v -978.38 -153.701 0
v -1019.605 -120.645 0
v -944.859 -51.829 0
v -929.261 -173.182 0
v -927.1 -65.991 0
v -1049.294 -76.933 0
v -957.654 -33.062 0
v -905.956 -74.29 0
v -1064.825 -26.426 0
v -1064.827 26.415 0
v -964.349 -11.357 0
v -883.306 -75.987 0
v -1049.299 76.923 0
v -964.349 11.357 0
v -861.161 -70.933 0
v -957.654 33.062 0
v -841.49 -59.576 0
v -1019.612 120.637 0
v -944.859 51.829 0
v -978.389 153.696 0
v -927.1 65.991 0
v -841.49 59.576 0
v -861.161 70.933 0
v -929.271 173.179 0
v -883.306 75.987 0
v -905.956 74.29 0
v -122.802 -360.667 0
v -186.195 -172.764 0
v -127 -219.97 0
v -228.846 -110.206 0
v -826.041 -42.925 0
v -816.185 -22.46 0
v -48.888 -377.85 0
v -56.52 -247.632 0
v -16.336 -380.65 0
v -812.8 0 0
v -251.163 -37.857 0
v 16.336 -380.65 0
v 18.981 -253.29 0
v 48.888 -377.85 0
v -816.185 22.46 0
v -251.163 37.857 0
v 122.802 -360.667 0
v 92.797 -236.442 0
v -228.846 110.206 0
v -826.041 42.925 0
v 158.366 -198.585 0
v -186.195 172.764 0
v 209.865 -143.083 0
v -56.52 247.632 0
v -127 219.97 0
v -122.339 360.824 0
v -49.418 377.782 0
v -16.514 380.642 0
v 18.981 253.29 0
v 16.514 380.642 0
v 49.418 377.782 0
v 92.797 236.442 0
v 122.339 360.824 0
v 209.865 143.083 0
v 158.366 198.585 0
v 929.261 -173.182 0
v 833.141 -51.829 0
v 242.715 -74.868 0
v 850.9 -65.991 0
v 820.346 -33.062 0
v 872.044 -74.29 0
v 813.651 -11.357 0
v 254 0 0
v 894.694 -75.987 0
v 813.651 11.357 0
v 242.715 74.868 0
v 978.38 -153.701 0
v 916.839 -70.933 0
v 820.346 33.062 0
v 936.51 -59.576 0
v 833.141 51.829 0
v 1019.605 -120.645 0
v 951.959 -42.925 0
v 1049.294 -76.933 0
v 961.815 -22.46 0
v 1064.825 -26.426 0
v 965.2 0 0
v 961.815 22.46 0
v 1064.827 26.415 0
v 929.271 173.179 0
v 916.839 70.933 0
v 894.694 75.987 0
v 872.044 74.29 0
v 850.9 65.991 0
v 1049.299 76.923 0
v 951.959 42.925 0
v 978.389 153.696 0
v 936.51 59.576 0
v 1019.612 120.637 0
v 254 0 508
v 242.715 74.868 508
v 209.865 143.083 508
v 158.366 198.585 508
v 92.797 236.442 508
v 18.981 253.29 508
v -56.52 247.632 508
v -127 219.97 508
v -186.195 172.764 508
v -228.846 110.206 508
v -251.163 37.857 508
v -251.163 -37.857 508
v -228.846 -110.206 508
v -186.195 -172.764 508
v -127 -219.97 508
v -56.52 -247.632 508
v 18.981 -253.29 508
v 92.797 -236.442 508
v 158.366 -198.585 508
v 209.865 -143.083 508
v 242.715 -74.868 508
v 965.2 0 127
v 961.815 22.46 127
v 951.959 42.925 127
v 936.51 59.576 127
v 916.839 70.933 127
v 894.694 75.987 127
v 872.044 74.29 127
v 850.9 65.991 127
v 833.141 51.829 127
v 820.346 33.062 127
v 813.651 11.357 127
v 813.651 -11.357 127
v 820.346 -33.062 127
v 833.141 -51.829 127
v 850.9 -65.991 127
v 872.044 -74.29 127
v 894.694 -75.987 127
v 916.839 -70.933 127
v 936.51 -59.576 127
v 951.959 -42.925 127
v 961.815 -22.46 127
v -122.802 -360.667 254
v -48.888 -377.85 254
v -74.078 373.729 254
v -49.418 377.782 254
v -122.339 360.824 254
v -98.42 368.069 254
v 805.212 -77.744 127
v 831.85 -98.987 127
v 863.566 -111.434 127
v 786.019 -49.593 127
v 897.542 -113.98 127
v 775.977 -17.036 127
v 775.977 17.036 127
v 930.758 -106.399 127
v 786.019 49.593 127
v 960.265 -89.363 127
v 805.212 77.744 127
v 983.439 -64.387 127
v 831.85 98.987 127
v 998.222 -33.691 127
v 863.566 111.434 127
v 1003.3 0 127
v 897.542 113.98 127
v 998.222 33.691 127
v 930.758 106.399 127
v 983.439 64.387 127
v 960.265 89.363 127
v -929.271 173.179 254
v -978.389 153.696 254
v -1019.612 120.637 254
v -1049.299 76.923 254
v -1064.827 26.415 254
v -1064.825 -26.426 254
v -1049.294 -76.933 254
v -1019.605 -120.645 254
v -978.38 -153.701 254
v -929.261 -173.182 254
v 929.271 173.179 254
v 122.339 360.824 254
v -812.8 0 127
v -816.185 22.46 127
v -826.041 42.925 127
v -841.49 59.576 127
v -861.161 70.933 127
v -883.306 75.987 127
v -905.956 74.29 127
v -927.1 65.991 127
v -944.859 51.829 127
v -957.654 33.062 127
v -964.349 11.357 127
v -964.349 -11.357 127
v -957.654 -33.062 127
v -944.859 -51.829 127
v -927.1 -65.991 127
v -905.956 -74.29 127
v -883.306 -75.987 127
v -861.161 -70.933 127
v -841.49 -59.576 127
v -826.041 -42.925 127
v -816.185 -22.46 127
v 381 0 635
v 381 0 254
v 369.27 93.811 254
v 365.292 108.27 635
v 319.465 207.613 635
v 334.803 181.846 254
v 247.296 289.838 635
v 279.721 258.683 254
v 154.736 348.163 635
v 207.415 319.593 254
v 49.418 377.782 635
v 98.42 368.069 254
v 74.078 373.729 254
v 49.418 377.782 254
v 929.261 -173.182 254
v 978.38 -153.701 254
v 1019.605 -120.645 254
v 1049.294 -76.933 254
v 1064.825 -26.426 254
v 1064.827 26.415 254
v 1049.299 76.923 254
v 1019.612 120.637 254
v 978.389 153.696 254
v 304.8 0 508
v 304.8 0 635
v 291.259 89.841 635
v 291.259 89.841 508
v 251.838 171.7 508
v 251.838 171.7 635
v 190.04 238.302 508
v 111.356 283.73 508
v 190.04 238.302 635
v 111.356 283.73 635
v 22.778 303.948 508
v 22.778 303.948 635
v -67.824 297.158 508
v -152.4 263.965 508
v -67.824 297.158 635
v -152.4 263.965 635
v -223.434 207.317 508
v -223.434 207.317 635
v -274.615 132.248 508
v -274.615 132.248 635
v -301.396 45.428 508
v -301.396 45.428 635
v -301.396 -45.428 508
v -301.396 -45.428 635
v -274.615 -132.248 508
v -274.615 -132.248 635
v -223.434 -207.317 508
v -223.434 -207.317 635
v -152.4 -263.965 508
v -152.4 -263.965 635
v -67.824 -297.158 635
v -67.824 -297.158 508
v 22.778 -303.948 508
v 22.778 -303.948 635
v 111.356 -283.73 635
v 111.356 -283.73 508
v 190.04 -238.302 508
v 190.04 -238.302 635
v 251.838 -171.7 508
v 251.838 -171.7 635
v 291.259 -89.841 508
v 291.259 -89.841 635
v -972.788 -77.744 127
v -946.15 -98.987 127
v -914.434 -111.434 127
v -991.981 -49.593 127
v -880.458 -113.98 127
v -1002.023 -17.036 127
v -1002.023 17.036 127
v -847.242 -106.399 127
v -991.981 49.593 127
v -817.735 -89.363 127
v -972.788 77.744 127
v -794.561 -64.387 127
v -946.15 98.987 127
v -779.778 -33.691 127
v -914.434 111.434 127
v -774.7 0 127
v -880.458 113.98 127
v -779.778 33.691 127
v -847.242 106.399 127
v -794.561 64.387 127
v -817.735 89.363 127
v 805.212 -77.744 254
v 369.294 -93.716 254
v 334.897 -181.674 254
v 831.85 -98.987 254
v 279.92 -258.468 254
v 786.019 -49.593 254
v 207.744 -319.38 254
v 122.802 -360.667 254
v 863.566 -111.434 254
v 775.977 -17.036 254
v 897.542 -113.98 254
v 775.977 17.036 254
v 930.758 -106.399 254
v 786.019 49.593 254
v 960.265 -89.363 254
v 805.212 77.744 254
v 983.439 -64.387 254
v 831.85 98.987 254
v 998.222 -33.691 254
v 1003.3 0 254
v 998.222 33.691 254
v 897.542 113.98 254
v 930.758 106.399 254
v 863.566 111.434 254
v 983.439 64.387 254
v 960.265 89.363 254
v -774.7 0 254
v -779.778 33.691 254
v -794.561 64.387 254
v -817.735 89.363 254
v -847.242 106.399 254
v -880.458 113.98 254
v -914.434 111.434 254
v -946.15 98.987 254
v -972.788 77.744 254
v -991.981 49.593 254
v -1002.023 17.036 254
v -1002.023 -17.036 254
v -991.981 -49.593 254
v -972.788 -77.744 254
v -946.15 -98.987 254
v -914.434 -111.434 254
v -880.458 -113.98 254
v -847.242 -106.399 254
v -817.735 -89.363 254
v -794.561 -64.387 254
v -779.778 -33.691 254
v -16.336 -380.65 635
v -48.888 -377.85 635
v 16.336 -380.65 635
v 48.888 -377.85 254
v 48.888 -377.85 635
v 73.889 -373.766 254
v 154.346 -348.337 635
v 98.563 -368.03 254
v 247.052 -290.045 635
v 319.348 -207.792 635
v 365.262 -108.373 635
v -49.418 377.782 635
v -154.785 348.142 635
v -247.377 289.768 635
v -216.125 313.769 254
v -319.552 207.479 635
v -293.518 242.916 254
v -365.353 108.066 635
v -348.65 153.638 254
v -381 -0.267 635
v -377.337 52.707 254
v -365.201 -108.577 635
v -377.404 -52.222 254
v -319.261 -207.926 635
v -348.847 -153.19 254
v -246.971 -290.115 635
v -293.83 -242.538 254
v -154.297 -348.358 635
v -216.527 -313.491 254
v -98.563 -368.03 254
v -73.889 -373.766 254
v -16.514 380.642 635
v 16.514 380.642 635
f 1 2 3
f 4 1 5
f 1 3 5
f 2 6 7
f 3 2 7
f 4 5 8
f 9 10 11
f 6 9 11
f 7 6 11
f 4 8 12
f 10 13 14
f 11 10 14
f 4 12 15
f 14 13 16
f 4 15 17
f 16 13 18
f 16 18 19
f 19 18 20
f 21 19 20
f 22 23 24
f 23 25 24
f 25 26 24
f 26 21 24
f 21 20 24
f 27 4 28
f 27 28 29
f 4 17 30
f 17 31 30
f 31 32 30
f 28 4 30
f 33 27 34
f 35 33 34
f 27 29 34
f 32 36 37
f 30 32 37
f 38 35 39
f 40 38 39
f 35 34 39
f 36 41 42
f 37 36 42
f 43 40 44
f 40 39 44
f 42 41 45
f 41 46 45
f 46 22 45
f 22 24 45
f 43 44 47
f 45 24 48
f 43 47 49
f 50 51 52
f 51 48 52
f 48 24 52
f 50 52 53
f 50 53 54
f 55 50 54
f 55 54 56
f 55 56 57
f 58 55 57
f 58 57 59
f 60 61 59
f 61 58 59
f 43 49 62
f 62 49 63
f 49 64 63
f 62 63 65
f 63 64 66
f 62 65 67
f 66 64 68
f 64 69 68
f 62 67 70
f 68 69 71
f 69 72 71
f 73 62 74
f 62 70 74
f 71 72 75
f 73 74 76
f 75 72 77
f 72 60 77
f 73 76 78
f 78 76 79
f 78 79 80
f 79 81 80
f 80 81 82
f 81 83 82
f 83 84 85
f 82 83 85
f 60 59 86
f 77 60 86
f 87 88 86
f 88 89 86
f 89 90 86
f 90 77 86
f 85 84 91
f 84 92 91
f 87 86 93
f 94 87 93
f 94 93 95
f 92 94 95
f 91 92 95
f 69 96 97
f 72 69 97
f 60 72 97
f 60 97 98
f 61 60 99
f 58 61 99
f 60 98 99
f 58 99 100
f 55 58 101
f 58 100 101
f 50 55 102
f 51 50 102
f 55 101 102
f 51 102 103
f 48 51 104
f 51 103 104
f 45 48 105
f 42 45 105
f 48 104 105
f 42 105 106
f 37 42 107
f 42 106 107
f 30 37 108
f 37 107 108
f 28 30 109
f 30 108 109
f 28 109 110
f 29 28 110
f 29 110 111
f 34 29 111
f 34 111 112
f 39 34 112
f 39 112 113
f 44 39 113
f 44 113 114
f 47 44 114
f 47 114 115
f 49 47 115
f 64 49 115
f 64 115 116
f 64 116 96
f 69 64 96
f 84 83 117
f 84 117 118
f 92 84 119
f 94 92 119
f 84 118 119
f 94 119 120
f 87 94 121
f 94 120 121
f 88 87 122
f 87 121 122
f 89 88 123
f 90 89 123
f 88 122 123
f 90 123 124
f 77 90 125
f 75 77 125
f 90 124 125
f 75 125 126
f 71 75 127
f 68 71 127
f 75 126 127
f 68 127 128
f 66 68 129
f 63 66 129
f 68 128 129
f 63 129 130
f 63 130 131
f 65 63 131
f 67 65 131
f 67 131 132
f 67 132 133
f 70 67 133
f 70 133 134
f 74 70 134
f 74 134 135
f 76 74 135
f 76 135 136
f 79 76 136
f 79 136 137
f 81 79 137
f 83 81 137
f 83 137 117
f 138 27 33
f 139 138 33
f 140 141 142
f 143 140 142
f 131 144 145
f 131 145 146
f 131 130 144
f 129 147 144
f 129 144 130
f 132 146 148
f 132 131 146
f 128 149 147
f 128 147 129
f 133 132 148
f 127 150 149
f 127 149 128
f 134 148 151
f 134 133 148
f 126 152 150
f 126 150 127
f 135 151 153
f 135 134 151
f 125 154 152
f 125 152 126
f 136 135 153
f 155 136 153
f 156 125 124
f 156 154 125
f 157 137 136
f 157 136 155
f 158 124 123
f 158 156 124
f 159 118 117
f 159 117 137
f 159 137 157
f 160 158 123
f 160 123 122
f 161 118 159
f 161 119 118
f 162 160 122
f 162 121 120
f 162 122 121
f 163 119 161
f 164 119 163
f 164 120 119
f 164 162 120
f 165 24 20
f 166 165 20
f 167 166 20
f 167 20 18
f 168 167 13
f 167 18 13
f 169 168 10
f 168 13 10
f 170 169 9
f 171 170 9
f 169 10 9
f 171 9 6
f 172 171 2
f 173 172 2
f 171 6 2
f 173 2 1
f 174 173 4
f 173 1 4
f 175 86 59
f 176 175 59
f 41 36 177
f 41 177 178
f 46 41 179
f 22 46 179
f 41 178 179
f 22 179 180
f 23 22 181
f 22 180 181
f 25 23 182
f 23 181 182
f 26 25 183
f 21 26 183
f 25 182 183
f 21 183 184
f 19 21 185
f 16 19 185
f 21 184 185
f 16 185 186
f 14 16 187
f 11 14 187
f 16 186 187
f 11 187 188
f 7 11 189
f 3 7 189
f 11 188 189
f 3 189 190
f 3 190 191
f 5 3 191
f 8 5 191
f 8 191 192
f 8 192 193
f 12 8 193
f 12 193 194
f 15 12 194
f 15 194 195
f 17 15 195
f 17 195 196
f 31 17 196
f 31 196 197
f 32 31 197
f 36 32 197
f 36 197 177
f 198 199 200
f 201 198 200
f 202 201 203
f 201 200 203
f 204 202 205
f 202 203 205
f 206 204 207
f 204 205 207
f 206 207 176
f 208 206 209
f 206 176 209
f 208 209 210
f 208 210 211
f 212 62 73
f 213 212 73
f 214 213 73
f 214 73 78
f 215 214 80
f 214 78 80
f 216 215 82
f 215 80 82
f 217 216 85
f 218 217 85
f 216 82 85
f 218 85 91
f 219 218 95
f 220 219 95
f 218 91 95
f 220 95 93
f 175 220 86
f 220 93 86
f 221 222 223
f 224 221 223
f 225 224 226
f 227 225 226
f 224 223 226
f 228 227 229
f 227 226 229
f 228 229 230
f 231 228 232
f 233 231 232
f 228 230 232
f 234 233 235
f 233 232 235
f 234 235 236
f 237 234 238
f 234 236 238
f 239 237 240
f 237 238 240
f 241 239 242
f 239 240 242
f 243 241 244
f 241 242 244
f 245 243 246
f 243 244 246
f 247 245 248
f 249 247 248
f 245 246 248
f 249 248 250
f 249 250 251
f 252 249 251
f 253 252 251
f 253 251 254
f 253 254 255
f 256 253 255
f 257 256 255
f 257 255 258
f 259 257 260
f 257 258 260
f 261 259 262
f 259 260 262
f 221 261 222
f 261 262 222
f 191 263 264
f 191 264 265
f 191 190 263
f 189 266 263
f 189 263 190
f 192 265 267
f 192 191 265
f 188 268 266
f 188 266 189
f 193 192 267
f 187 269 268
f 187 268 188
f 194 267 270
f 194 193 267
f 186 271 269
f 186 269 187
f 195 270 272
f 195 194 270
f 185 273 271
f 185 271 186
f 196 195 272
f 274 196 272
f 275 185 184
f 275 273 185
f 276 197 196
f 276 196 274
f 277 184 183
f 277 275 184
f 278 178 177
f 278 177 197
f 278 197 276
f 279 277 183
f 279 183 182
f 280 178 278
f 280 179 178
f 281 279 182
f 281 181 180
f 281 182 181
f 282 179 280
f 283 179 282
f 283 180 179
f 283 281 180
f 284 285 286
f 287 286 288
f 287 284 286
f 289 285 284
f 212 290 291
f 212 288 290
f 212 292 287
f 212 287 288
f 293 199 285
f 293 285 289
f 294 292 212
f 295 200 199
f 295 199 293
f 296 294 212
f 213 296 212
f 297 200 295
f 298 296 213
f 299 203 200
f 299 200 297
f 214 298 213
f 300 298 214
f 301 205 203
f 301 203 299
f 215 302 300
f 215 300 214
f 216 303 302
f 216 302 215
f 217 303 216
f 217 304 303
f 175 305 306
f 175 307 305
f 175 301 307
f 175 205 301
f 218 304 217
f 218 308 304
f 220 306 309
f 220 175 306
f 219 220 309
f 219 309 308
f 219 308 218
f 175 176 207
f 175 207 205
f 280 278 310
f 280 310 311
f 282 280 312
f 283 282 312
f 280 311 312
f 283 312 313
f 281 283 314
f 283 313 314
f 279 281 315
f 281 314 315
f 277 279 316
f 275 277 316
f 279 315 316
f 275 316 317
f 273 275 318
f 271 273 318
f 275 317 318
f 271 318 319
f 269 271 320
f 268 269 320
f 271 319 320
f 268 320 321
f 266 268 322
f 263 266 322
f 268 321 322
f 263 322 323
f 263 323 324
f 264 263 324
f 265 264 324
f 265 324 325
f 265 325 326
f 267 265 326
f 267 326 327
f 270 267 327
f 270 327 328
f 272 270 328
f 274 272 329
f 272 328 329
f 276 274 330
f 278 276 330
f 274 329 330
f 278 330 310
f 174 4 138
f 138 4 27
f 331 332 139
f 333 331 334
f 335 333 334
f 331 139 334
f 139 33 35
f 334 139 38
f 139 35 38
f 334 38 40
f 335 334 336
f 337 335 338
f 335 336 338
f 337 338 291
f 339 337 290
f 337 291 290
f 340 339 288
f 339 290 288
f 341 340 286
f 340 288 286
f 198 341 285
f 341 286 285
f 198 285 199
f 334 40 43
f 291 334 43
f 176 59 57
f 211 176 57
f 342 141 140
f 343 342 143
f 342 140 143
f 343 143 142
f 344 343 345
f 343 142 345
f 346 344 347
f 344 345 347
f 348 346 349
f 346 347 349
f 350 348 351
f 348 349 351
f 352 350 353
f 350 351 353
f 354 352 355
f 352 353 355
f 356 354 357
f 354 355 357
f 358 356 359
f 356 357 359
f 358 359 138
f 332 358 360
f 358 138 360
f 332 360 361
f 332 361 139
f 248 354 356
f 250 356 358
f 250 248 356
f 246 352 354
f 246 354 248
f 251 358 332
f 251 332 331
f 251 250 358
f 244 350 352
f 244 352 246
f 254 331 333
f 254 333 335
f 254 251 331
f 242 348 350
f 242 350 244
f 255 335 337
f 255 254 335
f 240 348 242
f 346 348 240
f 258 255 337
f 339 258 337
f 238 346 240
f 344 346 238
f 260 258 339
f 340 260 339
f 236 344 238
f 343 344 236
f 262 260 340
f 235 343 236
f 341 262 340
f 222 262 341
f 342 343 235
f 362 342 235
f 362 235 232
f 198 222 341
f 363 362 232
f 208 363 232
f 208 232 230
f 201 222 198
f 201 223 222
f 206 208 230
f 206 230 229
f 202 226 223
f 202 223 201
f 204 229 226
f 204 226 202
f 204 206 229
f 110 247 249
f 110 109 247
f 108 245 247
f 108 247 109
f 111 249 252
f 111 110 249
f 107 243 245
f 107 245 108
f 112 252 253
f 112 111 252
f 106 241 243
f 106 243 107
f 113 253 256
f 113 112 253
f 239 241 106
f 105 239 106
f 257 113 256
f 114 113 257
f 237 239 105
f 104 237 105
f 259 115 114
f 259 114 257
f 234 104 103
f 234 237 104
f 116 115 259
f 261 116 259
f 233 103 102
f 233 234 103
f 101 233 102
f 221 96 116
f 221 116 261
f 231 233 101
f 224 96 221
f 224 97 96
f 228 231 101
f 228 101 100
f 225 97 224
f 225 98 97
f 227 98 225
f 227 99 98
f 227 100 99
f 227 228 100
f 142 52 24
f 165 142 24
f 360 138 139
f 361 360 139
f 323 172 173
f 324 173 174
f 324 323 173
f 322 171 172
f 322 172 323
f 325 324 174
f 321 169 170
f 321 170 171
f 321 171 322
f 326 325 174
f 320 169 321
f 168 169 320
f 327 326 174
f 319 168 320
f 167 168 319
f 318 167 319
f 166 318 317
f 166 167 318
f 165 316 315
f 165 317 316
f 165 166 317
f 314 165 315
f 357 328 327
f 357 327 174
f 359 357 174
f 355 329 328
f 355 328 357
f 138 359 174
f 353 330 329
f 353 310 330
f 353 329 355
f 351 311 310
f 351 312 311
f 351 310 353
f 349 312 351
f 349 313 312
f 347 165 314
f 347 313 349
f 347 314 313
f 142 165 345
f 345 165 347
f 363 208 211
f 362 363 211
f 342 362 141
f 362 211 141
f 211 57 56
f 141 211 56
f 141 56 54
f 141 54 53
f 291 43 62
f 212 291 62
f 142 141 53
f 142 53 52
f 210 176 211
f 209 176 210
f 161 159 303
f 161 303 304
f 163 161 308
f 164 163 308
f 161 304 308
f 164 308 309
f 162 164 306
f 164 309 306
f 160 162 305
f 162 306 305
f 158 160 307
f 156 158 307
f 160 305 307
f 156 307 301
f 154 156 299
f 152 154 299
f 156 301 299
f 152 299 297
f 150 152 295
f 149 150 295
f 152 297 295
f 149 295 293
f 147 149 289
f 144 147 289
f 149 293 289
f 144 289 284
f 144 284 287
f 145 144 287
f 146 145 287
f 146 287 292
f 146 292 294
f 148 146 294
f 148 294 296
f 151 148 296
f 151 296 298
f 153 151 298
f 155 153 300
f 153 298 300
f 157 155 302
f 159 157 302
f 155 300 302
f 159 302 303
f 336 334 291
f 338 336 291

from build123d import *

# Parameters (mm, degrees)
F1_DEPTH  = 254
F3_DEPTH  = 381
F4_R      = 254
F5_DEPTH  = 635
F6_R      = 304.8
F7_DEPTH  = 127
F8_R      = 76.2
F9_DEPTH  = 254
F10_R     = 114.3
F11_DEPTH = 127
F12_R     = 114.3
F13_DEPTH = 127


with BuildPart() as f1:
    # F0 (on Top) → F1 (new body)
    with BuildSketch(Plane.XY):
        with BuildLine():
            ThreePointArc((-122.801875, -360.66702), (-380.999921, 0.244657), (-122.338574, 360.824436))
            Line((-122.338574, 360.824436), (-929.271327, 173.179272))
            ThreePointArc((-929.271327, 173.179272), (-1066.8, -0.005195), (-929.261206, -173.181625))
            Line((-929.261206, -173.181625), (-122.801875, -360.66702))
        make_face()
        with BuildLine():
            Line((122.338574, 360.824436), (49.417791, 377.781527))
            ThreePointArc((49.417791, 377.781527), (0, 381), (-49.417791, 377.781527))
            Line((-49.417791, 377.781527), (-122.338574, 360.824436))
            ThreePointArc((-122.338574, 360.824436), (-380.999921, 0.244657), (-122.801875, -360.66702))
            Line((-122.801875, -360.66702), (-48.888407, -377.850399))
            ThreePointArc((-48.888407, -377.850399), (0, -381), (48.888407, -377.850399))
            Line((48.888407, -377.850399), (122.801875, -360.66702))
            ThreePointArc((122.801875, -360.66702), (309.797123, -221.780844), (381, 0))
            ThreePointArc((381, 0), (309.654644, 221.979733), (122.338574, 360.824436))
        make_face()
        with BuildLine():
            Line((929.271327, 173.179272), (122.338574, 360.824436))
            ThreePointArc((122.338574, 360.824436), (309.654644, 221.979733), (381, 0))
            ThreePointArc((381, 0), (309.797123, -221.780844), (122.801875, -360.66702))
            Line((122.801875, -360.66702), (929.261206, -173.181625))
            ThreePointArc((929.261206, -173.181625), (1066.8, -0.005195), (929.271327, 173.179272))
        make_face()
    extrude(amount=F1_DEPTH)

    # F2 (on face) → F3 (join)
    with BuildSketch(Plane.XY.offset(254)):
        with BuildLine():
            ThreePointArc((381, 0), (286.346973, 251.329288), (49.417791, 377.781527))
            ThreePointArc((49.417791, 377.781527), (0, 381), (-49.417791, 377.781527))
            ThreePointArc((-49.417791, 377.781527), (-380.999906, -0.266923), (-48.888407, -377.850399))
            ThreePointArc((-48.888407, -377.850399), (0, -381), (48.888407, -377.850399))
            ThreePointArc((48.888407, -377.850399), (286.170826, -251.529836), (381, 0))
        make_face()
    extrude(amount=F3_DEPTH)

    # F4 (on face) → F5 (cut)
    with BuildSketch(Plane.XY.offset(635)):
        Circle(F4_R)
    extrude(amount=-F5_DEPTH, mode=Mode.SUBTRACT)

    # F6 (on face) → F7 (cut)
    with BuildSketch(Plane.XY.offset(635)):
        Circle(F6_R)
    extrude(amount=-F7_DEPTH, mode=Mode.SUBTRACT)

    # F8 (on face) → F9 (cut)
    with BuildSketch(Plane.XY.offset(254)):
        with Locations((889, 0)):
            Circle(F8_R)
        with Locations((-889, 0)):
            Circle(F8_R)
    extrude(amount=-F9_DEPTH, mode=Mode.SUBTRACT)

    # F10 (on face) → F11 (cut)
    with BuildSketch(Plane.XY.offset(254)):
        with Locations((-889, 0)):
            Circle(F10_R)
    extrude(amount=-F11_DEPTH, mode=Mode.SUBTRACT)

    # F12 (on face) → F13 (cut)
    with BuildSketch(Plane.XY.offset(254)):
        with Locations((889, 0)):
            Circle(F12_R)
    extrude(amount=-F13_DEPTH, mode=Mode.SUBTRACT)


solid = f1.part
